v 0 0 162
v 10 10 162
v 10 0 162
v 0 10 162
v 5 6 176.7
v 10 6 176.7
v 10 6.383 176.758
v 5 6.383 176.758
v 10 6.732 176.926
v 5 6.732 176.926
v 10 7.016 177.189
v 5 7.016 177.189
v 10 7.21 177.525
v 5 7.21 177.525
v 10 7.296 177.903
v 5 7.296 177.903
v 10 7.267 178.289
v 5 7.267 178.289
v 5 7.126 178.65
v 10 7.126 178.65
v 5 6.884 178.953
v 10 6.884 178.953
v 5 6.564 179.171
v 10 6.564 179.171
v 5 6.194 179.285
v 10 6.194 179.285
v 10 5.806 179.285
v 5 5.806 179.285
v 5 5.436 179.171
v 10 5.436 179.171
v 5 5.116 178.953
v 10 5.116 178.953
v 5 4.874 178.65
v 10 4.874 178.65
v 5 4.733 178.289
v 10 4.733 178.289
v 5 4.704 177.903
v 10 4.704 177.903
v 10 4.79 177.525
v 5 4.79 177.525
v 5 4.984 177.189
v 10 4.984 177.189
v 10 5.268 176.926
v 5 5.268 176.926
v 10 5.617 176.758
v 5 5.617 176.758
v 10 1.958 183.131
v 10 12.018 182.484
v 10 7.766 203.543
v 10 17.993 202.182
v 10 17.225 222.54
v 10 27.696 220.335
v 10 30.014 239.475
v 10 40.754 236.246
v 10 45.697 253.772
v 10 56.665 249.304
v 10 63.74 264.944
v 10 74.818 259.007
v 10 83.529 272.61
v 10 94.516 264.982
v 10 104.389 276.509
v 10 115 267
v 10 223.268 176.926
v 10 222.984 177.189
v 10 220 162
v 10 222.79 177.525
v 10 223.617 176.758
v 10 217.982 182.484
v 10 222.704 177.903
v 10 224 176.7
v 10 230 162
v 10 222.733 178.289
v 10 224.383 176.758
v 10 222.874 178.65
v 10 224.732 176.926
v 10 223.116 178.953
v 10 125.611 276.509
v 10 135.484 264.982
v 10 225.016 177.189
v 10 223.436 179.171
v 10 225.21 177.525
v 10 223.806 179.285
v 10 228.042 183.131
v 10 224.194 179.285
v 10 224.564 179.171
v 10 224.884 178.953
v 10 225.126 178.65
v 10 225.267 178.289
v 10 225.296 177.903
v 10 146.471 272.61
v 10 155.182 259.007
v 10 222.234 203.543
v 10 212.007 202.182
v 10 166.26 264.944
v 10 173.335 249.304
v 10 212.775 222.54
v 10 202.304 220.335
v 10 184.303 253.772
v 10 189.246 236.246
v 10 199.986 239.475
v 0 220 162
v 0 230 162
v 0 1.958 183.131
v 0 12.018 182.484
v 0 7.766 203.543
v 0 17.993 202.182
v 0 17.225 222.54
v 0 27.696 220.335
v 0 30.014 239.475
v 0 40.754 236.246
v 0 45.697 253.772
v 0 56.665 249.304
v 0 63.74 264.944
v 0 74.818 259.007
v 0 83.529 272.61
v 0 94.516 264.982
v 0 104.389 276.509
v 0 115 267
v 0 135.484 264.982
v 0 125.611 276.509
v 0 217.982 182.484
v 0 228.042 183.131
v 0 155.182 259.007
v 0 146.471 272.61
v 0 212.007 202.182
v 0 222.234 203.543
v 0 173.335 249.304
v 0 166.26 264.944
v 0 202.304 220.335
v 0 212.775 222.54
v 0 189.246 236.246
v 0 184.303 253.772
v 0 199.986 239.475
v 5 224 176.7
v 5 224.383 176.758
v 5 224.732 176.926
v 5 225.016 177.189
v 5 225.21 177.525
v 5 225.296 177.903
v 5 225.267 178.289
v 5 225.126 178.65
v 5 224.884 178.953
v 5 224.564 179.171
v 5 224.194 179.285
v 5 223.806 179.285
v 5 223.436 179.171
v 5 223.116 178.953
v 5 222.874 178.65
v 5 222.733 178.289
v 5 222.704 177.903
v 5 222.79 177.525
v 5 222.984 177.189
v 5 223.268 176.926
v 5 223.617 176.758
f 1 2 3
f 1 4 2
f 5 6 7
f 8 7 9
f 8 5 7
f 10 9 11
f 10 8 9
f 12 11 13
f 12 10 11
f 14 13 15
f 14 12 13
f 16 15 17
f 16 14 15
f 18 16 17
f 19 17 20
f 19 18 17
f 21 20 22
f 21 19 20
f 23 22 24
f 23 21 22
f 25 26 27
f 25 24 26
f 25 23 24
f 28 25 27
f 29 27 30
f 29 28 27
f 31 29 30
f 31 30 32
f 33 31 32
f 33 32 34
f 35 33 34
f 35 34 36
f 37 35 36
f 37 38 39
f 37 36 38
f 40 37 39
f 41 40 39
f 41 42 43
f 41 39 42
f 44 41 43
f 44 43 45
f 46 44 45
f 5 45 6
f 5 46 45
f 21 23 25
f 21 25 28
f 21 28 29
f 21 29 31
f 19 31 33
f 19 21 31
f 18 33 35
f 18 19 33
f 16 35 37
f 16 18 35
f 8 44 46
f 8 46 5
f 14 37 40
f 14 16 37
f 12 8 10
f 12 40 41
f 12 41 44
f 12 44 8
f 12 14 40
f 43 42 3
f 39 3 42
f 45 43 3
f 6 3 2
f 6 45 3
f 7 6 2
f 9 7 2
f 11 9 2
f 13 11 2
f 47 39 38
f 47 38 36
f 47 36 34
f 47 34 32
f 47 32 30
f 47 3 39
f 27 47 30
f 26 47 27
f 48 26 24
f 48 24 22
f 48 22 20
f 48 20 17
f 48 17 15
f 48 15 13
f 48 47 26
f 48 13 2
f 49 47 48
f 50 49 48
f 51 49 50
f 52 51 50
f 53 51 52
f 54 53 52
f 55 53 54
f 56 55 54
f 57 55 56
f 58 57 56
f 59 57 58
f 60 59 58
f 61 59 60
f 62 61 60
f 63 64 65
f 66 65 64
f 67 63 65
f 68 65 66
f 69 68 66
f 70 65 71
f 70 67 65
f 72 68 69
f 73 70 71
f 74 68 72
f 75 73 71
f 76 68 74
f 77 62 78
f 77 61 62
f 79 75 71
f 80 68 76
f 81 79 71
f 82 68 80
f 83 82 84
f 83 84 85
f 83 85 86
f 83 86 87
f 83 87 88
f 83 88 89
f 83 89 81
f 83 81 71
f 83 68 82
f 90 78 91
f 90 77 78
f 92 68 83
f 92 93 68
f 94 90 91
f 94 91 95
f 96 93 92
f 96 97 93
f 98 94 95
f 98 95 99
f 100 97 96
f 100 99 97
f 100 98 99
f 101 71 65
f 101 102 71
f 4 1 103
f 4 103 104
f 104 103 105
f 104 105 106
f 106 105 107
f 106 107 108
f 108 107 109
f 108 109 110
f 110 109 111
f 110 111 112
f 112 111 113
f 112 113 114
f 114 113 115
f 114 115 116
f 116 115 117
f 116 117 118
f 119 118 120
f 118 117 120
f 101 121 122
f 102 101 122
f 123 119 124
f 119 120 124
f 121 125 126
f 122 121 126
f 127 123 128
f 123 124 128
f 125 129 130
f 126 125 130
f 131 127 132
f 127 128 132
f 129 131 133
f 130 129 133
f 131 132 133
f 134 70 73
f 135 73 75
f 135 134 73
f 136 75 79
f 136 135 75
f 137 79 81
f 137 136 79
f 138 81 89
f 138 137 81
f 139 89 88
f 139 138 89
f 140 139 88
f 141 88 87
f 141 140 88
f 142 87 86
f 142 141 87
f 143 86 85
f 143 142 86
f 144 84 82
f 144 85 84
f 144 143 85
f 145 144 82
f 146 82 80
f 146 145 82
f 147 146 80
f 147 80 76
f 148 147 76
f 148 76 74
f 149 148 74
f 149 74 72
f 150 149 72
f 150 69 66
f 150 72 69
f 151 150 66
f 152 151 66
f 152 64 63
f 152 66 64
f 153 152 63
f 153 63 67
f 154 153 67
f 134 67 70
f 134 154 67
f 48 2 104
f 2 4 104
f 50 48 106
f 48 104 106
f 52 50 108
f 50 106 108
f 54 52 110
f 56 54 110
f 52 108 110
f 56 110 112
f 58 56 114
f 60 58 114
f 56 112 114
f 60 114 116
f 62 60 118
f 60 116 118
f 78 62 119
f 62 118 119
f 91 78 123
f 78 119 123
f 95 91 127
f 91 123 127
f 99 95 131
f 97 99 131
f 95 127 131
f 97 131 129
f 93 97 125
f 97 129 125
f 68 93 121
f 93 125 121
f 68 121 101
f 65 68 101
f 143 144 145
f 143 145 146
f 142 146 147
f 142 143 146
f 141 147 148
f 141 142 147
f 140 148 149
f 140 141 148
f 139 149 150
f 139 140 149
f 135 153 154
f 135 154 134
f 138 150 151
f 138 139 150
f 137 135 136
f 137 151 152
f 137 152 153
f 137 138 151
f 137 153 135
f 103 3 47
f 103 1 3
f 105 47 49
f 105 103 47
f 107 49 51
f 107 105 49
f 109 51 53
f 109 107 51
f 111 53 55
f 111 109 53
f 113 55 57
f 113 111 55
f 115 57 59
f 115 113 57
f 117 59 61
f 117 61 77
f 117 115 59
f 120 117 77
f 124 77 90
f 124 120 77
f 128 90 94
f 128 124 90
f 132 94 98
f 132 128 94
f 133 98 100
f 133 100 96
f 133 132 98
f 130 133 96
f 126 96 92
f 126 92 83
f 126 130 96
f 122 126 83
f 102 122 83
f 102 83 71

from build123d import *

# Parameters (mm, degrees)
CYLINDER071_R     = 1.3
CYLINDER071_DEPTH = 331
CYLINDER062_R     = 1.3
CYLINDER062_DEPTH = 331
CYLINDER052_W     = 105
CYLINDER052_H     = 10
CYLINDER052_ANGLE = 180
CYLINDER051_W     = 115
CYLINDER051_H     = 10
CYLINDER051_ANGLE = 180


with BuildPart() as cilindro071:
    # Cylinder071 → Cylinder071 (new body)
    with BuildSketch(Plane(origin=(5, 224, 178), x_dir=(0, 0, -1), z_dir=(1, 0, 0))):
        Circle(CYLINDER071_R)
    extrude(amount=CYLINDER071_DEPTH)


with BuildPart() as cilindro062:
    # Cylinder062 → Cylinder062 (new body)
    with BuildSketch(Plane(origin=(5, 6, 178), x_dir=(0, 0, -1), z_dir=(1, 0, 0))):
        Circle(CYLINDER062_R)
    extrude(amount=CYLINDER062_DEPTH)


with BuildPart() as cilindro052:
    # Cylinder052 → Cylinder052 (revolve)
    with BuildSketch(Plane(origin=(-3, 115, 171), x_dir=(0, -1, 0), z_dir=(0, 0, -1))):
        with Locations((52.5, 5)):
            Rectangle(CYLINDER052_W, CYLINDER052_H)
    revolve(axis=Axis((-3, 115, 171), (-1, 0, 0)), revolution_arc=CYLINDER052_ANGLE)


with BuildPart() as cut080:
    # Cylinder051 → Cylinder051 (revolve)
    with BuildSketch(Plane(origin=(-3, 115, 171), x_dir=(0, -1, 0), z_dir=(0, 0, -1))):
        with Locations((57.5, 5)):
            Rectangle(CYLINDER051_W, CYLINDER051_H)
    revolve(axis=Axis((-3, 115, 171), (-1, 0, 0)), revolution_arc=CYLINDER051_ANGLE)

    # Cut066: cut Cilindro052
    add(cilindro052.part, mode=Mode.SUBTRACT)


with BuildPart() as cut080_1:
    # Cut066 placement: moved
    add(cut080.part.moved(Location((13, 0, -9))))

    # Cut073: cut Cilindro062
    add(cilindro062.part, mode=Mode.SUBTRACT)

    # Cut080: cut Cilindro071
    add(cilindro071.part, mode=Mode.SUBTRACT)


solid = cut080_1.part
